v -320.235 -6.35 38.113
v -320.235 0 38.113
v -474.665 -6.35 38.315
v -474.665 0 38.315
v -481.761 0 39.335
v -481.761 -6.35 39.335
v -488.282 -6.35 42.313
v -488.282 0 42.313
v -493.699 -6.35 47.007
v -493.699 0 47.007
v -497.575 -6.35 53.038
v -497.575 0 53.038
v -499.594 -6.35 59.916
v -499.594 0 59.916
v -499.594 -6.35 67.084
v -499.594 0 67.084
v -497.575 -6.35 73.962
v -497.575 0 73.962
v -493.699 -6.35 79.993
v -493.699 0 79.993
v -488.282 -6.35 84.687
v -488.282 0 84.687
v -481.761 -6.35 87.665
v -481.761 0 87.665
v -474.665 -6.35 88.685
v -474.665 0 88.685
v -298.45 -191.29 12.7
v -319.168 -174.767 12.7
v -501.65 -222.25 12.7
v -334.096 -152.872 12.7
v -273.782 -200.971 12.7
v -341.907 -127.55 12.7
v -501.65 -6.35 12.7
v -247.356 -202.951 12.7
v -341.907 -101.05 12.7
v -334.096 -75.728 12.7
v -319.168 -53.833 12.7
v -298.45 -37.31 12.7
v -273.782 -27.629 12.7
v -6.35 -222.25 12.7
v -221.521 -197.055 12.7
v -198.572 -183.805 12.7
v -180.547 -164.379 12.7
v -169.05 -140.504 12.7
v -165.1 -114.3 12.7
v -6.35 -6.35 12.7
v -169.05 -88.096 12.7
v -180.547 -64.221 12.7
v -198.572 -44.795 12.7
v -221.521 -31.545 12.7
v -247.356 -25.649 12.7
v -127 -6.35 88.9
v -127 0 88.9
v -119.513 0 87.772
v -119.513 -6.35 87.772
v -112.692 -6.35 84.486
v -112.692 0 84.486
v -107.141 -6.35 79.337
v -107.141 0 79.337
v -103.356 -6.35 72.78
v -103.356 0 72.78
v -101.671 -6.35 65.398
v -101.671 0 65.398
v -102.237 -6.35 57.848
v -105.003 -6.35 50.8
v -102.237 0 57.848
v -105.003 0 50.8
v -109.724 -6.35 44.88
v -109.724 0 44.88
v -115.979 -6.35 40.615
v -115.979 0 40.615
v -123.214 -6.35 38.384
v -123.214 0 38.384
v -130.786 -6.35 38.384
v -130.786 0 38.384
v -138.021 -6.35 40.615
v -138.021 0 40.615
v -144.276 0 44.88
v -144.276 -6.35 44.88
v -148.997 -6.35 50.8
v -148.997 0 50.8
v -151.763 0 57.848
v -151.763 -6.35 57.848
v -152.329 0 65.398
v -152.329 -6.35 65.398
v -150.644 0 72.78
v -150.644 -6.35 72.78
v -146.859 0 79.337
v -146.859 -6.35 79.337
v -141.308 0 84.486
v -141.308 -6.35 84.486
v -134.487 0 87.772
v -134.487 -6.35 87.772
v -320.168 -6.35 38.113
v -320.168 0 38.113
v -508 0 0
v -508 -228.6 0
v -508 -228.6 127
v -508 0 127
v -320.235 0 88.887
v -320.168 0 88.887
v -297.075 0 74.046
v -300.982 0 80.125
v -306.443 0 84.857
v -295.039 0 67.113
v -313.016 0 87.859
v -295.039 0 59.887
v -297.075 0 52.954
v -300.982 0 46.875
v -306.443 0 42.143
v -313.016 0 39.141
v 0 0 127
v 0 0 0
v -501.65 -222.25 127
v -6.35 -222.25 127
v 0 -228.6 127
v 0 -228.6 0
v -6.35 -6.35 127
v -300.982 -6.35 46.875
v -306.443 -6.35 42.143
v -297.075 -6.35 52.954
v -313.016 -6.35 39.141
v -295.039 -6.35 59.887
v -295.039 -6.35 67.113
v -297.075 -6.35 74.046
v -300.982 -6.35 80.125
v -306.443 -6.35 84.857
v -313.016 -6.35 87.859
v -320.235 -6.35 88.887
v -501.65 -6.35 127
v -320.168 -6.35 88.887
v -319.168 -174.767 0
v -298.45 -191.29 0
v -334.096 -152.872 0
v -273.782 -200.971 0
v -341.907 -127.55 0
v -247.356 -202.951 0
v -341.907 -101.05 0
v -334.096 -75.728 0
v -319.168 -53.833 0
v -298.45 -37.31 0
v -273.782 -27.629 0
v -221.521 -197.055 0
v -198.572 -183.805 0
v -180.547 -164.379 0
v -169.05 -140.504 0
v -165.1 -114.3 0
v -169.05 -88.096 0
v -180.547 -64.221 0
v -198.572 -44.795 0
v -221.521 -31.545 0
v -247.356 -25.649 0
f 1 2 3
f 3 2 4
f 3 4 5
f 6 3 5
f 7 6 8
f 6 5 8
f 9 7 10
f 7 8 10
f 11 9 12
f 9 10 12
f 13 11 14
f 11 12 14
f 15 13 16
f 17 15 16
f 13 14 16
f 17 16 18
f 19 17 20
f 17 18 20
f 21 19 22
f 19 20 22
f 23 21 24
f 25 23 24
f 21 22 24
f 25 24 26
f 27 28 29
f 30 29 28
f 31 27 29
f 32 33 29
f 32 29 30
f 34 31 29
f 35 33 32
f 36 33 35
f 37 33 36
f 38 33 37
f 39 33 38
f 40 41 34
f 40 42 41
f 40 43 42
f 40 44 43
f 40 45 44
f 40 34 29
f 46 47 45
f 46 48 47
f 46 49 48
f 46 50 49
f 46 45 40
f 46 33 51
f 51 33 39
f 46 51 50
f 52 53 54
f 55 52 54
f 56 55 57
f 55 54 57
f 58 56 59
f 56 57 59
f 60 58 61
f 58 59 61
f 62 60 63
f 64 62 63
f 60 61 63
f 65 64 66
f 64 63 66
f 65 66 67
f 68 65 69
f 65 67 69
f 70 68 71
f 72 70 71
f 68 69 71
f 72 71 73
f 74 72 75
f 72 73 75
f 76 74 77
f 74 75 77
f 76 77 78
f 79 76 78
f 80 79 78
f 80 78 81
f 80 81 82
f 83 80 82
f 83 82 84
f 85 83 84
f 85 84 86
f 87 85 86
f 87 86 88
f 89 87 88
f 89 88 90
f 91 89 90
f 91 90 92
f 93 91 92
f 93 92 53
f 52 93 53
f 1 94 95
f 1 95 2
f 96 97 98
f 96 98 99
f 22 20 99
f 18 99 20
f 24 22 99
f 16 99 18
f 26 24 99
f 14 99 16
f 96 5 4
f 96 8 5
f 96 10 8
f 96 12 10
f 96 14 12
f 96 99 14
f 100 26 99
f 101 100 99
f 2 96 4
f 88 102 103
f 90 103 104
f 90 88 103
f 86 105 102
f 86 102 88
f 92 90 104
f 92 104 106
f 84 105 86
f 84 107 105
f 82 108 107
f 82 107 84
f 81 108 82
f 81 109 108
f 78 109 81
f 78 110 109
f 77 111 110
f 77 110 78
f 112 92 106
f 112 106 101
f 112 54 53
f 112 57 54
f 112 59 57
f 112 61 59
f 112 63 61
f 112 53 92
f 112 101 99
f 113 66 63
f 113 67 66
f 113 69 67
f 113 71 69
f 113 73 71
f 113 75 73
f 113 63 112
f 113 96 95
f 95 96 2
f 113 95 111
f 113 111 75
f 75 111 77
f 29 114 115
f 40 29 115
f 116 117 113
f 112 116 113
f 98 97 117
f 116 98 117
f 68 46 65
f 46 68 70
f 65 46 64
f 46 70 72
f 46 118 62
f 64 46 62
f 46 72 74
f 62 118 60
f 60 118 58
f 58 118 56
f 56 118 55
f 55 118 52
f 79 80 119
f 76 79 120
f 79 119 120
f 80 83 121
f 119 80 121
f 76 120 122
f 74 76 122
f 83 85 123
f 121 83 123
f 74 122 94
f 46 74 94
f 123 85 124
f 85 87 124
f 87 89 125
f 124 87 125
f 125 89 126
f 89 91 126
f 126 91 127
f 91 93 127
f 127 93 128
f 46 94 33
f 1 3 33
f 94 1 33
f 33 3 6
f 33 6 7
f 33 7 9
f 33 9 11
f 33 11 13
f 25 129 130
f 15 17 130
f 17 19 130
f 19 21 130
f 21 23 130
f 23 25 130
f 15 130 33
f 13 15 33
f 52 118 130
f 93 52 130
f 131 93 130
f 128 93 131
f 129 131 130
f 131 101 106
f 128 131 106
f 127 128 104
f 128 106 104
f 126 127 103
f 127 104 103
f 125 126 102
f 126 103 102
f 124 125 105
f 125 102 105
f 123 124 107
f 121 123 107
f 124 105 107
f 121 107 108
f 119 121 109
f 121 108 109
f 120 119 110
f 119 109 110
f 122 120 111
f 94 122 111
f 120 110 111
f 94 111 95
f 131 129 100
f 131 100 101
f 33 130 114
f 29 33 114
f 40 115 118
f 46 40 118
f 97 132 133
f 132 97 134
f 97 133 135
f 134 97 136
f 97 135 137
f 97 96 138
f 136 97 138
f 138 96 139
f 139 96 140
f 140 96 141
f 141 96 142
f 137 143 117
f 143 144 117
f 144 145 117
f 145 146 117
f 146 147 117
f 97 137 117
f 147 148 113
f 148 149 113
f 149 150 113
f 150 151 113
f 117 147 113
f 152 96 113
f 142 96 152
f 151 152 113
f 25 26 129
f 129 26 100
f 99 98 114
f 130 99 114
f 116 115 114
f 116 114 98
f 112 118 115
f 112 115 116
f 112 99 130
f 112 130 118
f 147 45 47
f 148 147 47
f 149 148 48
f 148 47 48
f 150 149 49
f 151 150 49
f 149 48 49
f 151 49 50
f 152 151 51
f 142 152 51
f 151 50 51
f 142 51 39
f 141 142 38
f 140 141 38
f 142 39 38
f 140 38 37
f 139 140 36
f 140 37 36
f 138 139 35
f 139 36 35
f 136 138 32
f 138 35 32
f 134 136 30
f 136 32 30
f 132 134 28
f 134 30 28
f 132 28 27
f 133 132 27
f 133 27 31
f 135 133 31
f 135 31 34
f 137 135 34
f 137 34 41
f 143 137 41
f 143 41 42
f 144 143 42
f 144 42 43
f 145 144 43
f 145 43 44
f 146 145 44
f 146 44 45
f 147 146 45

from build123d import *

# Parameters (mm, degrees)
SKETCH1_W           = 508
SKETCH1_H           = 228.6
BOSS_EXTRUDE1_DEPTH = 127
CUT_EXTRUDE1_DEPTH  = 114.3
SKETCH3_R           = 88.9
CUT_EXTRUDE2_DEPTH  = 157.988
SKETCH4_R           = 25.4
CUT_EXTRUDE3_DEPTH  = 157.988


with BuildPart() as part:
    # Sketch1 → Boss-Extrude1 (new body)
    with BuildSketch(Plane.XY):
        with Locations((-254, -114.3)):
            Rectangle(SKETCH1_W, SKETCH1_H)
    extrude(amount=BOSS_EXTRUDE1_DEPTH)

    # Sketch2 → Cut-Extrude1 (cut)
    with BuildSketch(Plane.XY.offset(127)):
        Polygon((-14.111111111, -6.35), (-254, -114.3), (-14.111111111, -222.25), (-6.35, -222.25), (-6.35, -6.35), align=None)
        Polygon((-14.111111111, -6.35), (-493.888888889, -6.35), (-254, -114.3), align=None)
        Polygon((-254, -114.3), (-493.888888889, -6.35), (-501.65, -6.35), (-501.65, -222.25), (-493.888888889, -222.25), align=None)
        Polygon((-14.111111111, -222.25), (-254, -114.3), (-493.888888889, -222.25), align=None)
    extrude(amount=-CUT_EXTRUDE1_DEPTH, mode=Mode.SUBTRACT)

    # Sketch3 → Cut-Extrude2 (cut)
    with BuildSketch(Plane.XY.offset(127)):
        with Locations((-254, -114.3)):
            Circle(SKETCH3_R)
    extrude(amount=-CUT_EXTRUDE2_DEPTH, mode=Mode.SUBTRACT)

    # Sketch4 → Cut-Extrude3 (cut)
    with BuildSketch(Plane(origin=(0, 0, 0), x_dir=(1, 0, 0), z_dir=(0, 1, 0))):
        with BuildLine():
            Line((-320.23493056, -38.112662334), (-474.665471548, -38.314758497))
            ThreePointArc((-474.665471548, -38.314758497), (-499.850713051, -63.5), (-474.665471548, -88.685241503))
            Line((-474.665471548, -88.685241503), (-320.23493056, -88.887337666))
            Line((-320.23493056, -88.887337666), (-320.168483959, -88.887424622))
            ThreePointArc((-320.168483959, -88.887424622), (-294.781059337, -63.5), (-320.168483959, -38.112575378))
            Line((-320.168483959, -38.112575378), (-320.23493056, -38.112662334))
        make_face()
        with Locations(Location((-127, -63.5, 0), (0, 0, 270))):
            Circle(SKETCH4_R)
    extrude(amount=-CUT_EXTRUDE3_DEPTH, mode=Mode.SUBTRACT)


solid = part.part
